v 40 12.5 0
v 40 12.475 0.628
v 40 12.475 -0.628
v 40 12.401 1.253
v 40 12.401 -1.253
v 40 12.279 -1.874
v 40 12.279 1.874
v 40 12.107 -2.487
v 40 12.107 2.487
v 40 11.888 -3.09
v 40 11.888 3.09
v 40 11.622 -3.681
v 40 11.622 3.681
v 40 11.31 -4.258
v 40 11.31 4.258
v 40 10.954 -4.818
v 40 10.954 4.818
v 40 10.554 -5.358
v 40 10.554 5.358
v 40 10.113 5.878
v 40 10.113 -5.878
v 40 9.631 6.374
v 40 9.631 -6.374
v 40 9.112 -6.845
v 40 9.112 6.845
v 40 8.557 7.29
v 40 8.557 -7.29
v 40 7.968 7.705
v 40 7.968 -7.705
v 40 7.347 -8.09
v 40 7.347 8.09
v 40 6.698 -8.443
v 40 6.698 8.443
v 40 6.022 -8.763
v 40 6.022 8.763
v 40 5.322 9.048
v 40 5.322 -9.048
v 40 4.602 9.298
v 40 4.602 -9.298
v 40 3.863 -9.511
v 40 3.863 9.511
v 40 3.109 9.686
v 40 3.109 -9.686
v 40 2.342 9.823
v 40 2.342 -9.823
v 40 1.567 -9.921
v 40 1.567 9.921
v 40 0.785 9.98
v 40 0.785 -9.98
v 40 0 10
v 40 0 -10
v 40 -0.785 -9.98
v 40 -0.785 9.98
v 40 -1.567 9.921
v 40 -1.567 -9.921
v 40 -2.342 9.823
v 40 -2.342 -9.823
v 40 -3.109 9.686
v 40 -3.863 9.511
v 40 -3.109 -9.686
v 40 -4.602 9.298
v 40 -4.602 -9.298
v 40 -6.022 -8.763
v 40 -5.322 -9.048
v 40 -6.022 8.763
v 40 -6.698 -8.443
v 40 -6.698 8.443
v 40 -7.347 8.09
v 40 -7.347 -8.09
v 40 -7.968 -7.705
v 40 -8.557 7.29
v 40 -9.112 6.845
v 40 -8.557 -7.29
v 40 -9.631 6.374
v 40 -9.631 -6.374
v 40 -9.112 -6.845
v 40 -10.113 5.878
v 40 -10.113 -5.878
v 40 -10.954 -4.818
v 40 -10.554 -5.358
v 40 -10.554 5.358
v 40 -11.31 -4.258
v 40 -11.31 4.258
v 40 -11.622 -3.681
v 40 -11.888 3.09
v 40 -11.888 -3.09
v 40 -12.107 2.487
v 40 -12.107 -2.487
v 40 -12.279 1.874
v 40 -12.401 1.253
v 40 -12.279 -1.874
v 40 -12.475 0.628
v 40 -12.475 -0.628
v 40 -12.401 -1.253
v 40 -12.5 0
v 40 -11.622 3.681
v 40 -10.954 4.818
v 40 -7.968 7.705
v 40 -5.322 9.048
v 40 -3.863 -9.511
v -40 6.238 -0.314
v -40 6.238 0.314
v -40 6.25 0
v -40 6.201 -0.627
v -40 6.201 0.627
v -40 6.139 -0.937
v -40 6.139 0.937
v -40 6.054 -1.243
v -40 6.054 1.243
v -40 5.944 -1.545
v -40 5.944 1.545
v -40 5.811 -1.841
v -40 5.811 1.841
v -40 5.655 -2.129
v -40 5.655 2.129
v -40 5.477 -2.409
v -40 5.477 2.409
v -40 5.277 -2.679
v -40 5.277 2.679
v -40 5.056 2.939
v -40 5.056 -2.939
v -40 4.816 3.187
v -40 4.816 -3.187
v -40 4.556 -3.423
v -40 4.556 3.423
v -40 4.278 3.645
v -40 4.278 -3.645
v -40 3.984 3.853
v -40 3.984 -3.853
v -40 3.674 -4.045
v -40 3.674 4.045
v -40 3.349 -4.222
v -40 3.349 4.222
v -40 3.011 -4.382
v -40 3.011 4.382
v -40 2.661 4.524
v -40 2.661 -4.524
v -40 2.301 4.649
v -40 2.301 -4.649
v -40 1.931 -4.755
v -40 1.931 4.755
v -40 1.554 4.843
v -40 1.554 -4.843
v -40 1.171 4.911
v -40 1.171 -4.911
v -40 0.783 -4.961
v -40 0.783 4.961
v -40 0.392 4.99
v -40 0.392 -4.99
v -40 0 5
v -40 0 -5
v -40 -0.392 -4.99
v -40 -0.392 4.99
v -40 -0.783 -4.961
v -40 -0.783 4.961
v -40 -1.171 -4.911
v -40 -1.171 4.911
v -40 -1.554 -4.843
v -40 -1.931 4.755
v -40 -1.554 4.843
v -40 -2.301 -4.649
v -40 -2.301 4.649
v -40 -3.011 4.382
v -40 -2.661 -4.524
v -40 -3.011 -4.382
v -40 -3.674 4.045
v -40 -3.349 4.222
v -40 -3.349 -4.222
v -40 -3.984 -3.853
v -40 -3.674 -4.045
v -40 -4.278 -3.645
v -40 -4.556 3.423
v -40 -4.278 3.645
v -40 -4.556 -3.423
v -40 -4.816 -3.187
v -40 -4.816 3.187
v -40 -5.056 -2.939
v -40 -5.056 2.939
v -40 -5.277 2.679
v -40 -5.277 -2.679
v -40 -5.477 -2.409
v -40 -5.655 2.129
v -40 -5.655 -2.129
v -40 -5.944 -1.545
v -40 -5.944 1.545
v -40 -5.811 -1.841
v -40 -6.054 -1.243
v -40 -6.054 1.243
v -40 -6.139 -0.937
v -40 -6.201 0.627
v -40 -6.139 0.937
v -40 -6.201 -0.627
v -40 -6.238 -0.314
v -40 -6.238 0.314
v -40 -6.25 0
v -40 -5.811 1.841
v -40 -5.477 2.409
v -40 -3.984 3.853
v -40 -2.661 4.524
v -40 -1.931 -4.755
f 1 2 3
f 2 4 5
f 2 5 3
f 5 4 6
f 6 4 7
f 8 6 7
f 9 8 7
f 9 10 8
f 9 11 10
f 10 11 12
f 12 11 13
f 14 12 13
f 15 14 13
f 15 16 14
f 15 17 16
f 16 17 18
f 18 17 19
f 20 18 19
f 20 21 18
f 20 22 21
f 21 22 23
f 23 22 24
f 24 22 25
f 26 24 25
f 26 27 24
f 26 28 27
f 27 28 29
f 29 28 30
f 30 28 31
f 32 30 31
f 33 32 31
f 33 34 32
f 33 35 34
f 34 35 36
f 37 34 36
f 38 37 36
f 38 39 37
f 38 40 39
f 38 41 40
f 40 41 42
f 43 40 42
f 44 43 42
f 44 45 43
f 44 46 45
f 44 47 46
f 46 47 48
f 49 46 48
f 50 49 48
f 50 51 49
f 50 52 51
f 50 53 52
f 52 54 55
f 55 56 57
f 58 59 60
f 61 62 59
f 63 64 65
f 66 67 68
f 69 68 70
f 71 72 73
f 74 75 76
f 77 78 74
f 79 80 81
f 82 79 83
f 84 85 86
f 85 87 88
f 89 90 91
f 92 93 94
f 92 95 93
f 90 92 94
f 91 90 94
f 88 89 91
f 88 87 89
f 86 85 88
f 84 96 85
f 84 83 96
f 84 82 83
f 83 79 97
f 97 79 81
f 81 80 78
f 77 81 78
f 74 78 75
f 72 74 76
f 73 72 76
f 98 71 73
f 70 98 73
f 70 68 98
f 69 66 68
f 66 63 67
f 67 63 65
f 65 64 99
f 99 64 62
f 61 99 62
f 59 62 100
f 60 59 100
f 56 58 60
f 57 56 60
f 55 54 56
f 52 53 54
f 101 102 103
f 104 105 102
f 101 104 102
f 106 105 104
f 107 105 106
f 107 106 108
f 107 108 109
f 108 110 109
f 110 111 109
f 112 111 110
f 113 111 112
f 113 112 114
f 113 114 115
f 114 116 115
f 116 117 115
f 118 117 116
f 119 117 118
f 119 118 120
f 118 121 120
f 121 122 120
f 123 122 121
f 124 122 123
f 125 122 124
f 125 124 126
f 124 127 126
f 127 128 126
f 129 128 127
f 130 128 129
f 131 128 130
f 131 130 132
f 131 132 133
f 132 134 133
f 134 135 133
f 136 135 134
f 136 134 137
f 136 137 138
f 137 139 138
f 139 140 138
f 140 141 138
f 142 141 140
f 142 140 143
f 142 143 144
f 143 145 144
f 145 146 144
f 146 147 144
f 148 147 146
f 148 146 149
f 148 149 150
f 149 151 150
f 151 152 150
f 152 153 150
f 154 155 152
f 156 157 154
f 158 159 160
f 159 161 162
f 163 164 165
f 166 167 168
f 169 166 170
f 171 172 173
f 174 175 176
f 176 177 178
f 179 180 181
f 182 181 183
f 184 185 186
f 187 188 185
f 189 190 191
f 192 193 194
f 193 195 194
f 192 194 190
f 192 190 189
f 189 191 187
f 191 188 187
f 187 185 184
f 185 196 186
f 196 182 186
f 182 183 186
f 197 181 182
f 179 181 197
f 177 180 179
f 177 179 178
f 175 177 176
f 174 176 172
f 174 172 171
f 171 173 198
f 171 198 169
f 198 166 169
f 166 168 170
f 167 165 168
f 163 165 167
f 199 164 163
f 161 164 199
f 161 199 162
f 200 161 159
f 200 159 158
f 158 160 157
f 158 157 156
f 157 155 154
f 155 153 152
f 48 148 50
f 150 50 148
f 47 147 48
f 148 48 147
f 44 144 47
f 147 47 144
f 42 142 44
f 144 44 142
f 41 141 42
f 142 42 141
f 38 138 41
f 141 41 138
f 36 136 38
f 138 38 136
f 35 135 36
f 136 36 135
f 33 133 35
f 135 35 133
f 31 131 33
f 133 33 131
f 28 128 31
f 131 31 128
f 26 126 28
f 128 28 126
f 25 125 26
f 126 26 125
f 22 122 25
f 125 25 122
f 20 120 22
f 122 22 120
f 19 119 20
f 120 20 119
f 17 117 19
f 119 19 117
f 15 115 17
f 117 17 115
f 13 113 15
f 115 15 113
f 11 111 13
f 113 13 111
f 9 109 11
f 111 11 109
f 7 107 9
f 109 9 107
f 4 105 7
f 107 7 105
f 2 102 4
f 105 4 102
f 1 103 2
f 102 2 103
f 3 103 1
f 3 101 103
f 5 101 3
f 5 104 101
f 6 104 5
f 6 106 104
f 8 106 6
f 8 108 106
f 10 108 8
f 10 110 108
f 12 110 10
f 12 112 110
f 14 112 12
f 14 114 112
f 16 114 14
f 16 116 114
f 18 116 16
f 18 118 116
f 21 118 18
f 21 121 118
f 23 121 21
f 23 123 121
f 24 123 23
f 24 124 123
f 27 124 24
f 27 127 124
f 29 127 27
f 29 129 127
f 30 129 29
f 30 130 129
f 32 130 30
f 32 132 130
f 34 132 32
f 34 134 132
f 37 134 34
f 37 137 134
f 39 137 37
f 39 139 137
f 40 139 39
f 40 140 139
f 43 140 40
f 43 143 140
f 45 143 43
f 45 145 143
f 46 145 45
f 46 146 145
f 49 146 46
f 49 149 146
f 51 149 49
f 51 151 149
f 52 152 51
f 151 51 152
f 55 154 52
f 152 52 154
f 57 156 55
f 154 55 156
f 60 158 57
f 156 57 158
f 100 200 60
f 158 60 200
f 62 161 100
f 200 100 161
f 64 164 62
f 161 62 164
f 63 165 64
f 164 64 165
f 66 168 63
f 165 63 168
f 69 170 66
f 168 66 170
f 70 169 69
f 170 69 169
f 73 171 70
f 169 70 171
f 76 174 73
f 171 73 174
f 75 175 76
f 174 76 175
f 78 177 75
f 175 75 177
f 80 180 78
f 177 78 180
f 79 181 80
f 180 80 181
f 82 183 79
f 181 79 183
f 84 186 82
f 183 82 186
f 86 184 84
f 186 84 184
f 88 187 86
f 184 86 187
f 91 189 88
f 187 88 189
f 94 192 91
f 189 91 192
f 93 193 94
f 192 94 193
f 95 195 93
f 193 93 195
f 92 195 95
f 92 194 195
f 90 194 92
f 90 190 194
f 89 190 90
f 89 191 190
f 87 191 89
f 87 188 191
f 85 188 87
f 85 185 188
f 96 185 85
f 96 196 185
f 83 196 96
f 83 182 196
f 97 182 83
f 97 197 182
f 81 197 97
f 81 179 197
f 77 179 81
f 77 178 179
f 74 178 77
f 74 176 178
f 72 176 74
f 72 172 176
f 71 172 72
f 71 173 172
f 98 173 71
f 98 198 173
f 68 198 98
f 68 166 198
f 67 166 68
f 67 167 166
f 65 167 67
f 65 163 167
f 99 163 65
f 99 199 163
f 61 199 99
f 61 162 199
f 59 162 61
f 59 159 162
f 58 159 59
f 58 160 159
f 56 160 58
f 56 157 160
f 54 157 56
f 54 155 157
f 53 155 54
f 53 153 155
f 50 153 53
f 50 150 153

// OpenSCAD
$fn = 100;

module rounded_car_body(length=80, rear_height=20, rear_width=25, scaling_factor=0.5) {
    rotate([0,-90,0])
        linear_extrude(height=length,center=true,scale=scaling_factor)
            resize([rear_height, rear_width])
                circle(d=rear_height);
}

rounded_car_body();
